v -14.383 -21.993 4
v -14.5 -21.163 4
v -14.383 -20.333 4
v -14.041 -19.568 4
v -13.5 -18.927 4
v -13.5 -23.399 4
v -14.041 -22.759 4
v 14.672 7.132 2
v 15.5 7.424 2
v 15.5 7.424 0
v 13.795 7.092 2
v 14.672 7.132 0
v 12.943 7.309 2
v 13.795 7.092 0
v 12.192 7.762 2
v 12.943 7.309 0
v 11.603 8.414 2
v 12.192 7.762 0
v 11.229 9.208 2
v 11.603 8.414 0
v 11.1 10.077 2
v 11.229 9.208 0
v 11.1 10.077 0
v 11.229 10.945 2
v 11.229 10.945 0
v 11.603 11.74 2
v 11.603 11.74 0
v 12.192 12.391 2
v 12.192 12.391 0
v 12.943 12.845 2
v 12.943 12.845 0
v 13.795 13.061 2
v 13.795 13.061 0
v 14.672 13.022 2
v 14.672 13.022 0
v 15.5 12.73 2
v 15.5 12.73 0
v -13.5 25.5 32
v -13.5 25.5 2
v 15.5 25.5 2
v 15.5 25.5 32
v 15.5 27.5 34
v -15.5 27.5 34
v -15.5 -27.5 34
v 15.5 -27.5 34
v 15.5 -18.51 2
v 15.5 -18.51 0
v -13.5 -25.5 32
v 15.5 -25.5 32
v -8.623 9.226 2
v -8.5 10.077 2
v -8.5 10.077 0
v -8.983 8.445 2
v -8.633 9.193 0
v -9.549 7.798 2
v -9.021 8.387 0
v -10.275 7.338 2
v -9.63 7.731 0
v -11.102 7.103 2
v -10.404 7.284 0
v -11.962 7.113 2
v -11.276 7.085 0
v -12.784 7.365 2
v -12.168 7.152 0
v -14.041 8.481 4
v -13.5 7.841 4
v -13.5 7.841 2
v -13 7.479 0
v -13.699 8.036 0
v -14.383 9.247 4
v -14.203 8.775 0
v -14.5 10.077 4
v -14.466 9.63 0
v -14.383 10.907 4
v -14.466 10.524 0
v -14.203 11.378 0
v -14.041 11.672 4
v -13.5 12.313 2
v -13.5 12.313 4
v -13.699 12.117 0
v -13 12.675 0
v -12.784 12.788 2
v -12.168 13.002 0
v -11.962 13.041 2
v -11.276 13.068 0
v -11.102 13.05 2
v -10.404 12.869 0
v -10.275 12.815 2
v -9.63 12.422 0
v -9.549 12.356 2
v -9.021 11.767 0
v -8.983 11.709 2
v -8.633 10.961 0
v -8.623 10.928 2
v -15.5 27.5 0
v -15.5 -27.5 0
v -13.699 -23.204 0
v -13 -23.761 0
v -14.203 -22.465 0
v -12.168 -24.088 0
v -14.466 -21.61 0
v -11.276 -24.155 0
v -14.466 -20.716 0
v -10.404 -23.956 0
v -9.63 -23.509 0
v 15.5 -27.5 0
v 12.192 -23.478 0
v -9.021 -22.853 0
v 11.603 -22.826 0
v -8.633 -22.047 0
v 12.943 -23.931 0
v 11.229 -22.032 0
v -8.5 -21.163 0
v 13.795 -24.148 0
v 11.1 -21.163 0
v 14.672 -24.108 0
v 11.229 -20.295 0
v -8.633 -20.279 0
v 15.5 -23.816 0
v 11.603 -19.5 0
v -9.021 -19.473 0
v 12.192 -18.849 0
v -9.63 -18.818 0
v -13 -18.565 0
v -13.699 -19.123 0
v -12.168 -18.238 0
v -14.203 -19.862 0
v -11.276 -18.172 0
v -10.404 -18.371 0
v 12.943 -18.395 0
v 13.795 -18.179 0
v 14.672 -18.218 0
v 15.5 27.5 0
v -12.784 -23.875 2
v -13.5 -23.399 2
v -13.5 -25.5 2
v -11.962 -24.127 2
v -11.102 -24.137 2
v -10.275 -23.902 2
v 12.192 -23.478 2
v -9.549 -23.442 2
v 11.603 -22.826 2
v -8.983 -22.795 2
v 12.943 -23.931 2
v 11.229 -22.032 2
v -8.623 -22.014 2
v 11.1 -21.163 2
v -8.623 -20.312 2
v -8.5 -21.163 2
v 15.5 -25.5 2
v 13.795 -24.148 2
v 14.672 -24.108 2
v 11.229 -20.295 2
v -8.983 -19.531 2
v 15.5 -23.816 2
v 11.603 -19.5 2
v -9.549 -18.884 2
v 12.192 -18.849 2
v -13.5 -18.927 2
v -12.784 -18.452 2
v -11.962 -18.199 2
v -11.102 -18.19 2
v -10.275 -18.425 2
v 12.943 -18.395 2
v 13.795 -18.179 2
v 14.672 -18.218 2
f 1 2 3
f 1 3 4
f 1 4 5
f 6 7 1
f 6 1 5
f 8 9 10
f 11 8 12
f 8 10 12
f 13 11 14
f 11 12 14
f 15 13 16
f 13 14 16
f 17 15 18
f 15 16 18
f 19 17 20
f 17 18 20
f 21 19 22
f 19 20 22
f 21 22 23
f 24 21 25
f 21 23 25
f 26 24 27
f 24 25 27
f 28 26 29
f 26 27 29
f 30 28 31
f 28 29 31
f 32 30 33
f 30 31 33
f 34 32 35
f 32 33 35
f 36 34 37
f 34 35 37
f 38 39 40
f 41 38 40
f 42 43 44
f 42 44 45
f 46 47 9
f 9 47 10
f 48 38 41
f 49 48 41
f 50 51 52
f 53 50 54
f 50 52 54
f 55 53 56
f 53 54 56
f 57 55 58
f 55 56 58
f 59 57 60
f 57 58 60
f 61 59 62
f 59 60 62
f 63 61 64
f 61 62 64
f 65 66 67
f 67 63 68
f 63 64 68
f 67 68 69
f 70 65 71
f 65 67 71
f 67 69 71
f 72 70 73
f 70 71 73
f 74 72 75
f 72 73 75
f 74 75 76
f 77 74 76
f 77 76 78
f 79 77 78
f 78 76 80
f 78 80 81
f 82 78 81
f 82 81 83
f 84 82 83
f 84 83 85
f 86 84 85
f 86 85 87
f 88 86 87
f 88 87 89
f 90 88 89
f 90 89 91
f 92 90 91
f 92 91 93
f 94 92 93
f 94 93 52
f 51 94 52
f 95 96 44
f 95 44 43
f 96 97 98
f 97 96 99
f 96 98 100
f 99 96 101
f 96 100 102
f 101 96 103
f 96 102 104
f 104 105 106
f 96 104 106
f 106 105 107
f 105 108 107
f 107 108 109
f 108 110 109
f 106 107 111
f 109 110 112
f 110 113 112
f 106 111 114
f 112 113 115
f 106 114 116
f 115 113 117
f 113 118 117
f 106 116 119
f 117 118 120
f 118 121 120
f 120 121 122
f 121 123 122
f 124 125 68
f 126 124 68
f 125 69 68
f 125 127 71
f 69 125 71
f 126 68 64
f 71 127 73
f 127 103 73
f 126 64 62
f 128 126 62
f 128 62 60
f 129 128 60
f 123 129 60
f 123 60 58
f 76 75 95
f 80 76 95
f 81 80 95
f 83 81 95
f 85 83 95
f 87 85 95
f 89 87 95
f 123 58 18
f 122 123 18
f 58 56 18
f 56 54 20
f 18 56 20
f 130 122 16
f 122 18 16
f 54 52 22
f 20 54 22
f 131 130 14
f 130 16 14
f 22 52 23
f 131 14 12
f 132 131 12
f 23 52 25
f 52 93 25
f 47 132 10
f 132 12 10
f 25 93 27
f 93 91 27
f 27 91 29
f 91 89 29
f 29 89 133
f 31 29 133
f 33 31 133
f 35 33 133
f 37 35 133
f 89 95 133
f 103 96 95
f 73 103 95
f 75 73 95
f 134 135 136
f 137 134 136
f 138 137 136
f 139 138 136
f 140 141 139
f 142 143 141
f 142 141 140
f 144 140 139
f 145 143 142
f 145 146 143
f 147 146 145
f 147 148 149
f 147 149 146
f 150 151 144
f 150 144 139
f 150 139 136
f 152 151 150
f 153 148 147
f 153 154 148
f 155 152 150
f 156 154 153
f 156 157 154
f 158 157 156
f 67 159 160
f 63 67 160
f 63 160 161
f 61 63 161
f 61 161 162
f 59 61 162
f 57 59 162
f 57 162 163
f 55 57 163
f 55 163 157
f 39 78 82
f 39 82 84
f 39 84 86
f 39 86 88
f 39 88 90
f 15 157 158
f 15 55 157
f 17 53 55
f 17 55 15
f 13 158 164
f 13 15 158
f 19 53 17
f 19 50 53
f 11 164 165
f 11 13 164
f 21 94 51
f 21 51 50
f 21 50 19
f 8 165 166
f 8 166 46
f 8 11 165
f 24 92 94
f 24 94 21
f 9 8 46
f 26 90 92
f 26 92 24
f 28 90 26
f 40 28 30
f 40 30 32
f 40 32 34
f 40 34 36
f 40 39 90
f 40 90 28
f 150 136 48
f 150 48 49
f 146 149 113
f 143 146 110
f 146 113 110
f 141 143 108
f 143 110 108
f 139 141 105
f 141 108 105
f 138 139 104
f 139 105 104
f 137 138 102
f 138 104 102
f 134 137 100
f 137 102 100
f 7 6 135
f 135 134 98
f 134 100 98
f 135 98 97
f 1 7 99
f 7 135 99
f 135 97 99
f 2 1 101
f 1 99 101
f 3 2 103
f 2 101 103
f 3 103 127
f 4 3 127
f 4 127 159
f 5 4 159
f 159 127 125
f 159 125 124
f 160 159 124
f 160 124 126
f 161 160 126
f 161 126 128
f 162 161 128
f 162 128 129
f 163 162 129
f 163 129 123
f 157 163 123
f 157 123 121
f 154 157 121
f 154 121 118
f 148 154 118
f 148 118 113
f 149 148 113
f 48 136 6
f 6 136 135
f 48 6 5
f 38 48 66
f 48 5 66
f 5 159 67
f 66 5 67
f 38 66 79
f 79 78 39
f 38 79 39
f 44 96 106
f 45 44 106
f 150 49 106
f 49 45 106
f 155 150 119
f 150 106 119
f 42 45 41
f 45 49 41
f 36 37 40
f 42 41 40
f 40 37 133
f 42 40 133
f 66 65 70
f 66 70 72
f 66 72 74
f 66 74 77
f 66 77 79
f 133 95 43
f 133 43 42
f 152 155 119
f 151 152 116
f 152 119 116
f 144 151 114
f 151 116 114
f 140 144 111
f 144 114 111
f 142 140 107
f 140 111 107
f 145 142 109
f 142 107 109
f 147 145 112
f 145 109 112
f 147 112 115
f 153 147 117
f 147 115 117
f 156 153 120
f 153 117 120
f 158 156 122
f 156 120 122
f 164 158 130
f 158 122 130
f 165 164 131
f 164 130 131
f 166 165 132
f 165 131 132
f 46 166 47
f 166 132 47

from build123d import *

# Parameters (mm, degrees)
F0_W     = 31
F0_H     = 55
F1_DEPTH = 34
F2_T     = -2
F3_R     = 3
F4_DEPTH = 4


with BuildPart() as f1:
    # F0 (on Top) → F1 (new body)
    with BuildSketch(Plane.XY):
        Rectangle(F0_W, F0_H)
    extrude(amount=F1_DEPTH)

    # F2
    f2_openings = [f1.faces().sort_by_distance(p)[0] for p in [
        (15.5, 0, 17),
    ]]
    offset(amount=F2_T, openings=f2_openings)

    # F3 (on face) → F4 (cut)
    with BuildSketch(Plane(origin=(0, 0, 0), x_dir=(1, 0, 0), z_dir=(0, 0, -1))):
        with Locations((-11.5, -10.076838)):
            Circle(F3_R)
        with Locations((-11.5, 21.163162)):
            Circle(F3_R)
        with Locations((14.1, -10.076838)):
            Circle(F3_R)
        with Locations((14.1, 21.163162)):
            Circle(F3_R)
    extrude(amount=-F4_DEPTH, mode=Mode.SUBTRACT)


solid = f1.part
